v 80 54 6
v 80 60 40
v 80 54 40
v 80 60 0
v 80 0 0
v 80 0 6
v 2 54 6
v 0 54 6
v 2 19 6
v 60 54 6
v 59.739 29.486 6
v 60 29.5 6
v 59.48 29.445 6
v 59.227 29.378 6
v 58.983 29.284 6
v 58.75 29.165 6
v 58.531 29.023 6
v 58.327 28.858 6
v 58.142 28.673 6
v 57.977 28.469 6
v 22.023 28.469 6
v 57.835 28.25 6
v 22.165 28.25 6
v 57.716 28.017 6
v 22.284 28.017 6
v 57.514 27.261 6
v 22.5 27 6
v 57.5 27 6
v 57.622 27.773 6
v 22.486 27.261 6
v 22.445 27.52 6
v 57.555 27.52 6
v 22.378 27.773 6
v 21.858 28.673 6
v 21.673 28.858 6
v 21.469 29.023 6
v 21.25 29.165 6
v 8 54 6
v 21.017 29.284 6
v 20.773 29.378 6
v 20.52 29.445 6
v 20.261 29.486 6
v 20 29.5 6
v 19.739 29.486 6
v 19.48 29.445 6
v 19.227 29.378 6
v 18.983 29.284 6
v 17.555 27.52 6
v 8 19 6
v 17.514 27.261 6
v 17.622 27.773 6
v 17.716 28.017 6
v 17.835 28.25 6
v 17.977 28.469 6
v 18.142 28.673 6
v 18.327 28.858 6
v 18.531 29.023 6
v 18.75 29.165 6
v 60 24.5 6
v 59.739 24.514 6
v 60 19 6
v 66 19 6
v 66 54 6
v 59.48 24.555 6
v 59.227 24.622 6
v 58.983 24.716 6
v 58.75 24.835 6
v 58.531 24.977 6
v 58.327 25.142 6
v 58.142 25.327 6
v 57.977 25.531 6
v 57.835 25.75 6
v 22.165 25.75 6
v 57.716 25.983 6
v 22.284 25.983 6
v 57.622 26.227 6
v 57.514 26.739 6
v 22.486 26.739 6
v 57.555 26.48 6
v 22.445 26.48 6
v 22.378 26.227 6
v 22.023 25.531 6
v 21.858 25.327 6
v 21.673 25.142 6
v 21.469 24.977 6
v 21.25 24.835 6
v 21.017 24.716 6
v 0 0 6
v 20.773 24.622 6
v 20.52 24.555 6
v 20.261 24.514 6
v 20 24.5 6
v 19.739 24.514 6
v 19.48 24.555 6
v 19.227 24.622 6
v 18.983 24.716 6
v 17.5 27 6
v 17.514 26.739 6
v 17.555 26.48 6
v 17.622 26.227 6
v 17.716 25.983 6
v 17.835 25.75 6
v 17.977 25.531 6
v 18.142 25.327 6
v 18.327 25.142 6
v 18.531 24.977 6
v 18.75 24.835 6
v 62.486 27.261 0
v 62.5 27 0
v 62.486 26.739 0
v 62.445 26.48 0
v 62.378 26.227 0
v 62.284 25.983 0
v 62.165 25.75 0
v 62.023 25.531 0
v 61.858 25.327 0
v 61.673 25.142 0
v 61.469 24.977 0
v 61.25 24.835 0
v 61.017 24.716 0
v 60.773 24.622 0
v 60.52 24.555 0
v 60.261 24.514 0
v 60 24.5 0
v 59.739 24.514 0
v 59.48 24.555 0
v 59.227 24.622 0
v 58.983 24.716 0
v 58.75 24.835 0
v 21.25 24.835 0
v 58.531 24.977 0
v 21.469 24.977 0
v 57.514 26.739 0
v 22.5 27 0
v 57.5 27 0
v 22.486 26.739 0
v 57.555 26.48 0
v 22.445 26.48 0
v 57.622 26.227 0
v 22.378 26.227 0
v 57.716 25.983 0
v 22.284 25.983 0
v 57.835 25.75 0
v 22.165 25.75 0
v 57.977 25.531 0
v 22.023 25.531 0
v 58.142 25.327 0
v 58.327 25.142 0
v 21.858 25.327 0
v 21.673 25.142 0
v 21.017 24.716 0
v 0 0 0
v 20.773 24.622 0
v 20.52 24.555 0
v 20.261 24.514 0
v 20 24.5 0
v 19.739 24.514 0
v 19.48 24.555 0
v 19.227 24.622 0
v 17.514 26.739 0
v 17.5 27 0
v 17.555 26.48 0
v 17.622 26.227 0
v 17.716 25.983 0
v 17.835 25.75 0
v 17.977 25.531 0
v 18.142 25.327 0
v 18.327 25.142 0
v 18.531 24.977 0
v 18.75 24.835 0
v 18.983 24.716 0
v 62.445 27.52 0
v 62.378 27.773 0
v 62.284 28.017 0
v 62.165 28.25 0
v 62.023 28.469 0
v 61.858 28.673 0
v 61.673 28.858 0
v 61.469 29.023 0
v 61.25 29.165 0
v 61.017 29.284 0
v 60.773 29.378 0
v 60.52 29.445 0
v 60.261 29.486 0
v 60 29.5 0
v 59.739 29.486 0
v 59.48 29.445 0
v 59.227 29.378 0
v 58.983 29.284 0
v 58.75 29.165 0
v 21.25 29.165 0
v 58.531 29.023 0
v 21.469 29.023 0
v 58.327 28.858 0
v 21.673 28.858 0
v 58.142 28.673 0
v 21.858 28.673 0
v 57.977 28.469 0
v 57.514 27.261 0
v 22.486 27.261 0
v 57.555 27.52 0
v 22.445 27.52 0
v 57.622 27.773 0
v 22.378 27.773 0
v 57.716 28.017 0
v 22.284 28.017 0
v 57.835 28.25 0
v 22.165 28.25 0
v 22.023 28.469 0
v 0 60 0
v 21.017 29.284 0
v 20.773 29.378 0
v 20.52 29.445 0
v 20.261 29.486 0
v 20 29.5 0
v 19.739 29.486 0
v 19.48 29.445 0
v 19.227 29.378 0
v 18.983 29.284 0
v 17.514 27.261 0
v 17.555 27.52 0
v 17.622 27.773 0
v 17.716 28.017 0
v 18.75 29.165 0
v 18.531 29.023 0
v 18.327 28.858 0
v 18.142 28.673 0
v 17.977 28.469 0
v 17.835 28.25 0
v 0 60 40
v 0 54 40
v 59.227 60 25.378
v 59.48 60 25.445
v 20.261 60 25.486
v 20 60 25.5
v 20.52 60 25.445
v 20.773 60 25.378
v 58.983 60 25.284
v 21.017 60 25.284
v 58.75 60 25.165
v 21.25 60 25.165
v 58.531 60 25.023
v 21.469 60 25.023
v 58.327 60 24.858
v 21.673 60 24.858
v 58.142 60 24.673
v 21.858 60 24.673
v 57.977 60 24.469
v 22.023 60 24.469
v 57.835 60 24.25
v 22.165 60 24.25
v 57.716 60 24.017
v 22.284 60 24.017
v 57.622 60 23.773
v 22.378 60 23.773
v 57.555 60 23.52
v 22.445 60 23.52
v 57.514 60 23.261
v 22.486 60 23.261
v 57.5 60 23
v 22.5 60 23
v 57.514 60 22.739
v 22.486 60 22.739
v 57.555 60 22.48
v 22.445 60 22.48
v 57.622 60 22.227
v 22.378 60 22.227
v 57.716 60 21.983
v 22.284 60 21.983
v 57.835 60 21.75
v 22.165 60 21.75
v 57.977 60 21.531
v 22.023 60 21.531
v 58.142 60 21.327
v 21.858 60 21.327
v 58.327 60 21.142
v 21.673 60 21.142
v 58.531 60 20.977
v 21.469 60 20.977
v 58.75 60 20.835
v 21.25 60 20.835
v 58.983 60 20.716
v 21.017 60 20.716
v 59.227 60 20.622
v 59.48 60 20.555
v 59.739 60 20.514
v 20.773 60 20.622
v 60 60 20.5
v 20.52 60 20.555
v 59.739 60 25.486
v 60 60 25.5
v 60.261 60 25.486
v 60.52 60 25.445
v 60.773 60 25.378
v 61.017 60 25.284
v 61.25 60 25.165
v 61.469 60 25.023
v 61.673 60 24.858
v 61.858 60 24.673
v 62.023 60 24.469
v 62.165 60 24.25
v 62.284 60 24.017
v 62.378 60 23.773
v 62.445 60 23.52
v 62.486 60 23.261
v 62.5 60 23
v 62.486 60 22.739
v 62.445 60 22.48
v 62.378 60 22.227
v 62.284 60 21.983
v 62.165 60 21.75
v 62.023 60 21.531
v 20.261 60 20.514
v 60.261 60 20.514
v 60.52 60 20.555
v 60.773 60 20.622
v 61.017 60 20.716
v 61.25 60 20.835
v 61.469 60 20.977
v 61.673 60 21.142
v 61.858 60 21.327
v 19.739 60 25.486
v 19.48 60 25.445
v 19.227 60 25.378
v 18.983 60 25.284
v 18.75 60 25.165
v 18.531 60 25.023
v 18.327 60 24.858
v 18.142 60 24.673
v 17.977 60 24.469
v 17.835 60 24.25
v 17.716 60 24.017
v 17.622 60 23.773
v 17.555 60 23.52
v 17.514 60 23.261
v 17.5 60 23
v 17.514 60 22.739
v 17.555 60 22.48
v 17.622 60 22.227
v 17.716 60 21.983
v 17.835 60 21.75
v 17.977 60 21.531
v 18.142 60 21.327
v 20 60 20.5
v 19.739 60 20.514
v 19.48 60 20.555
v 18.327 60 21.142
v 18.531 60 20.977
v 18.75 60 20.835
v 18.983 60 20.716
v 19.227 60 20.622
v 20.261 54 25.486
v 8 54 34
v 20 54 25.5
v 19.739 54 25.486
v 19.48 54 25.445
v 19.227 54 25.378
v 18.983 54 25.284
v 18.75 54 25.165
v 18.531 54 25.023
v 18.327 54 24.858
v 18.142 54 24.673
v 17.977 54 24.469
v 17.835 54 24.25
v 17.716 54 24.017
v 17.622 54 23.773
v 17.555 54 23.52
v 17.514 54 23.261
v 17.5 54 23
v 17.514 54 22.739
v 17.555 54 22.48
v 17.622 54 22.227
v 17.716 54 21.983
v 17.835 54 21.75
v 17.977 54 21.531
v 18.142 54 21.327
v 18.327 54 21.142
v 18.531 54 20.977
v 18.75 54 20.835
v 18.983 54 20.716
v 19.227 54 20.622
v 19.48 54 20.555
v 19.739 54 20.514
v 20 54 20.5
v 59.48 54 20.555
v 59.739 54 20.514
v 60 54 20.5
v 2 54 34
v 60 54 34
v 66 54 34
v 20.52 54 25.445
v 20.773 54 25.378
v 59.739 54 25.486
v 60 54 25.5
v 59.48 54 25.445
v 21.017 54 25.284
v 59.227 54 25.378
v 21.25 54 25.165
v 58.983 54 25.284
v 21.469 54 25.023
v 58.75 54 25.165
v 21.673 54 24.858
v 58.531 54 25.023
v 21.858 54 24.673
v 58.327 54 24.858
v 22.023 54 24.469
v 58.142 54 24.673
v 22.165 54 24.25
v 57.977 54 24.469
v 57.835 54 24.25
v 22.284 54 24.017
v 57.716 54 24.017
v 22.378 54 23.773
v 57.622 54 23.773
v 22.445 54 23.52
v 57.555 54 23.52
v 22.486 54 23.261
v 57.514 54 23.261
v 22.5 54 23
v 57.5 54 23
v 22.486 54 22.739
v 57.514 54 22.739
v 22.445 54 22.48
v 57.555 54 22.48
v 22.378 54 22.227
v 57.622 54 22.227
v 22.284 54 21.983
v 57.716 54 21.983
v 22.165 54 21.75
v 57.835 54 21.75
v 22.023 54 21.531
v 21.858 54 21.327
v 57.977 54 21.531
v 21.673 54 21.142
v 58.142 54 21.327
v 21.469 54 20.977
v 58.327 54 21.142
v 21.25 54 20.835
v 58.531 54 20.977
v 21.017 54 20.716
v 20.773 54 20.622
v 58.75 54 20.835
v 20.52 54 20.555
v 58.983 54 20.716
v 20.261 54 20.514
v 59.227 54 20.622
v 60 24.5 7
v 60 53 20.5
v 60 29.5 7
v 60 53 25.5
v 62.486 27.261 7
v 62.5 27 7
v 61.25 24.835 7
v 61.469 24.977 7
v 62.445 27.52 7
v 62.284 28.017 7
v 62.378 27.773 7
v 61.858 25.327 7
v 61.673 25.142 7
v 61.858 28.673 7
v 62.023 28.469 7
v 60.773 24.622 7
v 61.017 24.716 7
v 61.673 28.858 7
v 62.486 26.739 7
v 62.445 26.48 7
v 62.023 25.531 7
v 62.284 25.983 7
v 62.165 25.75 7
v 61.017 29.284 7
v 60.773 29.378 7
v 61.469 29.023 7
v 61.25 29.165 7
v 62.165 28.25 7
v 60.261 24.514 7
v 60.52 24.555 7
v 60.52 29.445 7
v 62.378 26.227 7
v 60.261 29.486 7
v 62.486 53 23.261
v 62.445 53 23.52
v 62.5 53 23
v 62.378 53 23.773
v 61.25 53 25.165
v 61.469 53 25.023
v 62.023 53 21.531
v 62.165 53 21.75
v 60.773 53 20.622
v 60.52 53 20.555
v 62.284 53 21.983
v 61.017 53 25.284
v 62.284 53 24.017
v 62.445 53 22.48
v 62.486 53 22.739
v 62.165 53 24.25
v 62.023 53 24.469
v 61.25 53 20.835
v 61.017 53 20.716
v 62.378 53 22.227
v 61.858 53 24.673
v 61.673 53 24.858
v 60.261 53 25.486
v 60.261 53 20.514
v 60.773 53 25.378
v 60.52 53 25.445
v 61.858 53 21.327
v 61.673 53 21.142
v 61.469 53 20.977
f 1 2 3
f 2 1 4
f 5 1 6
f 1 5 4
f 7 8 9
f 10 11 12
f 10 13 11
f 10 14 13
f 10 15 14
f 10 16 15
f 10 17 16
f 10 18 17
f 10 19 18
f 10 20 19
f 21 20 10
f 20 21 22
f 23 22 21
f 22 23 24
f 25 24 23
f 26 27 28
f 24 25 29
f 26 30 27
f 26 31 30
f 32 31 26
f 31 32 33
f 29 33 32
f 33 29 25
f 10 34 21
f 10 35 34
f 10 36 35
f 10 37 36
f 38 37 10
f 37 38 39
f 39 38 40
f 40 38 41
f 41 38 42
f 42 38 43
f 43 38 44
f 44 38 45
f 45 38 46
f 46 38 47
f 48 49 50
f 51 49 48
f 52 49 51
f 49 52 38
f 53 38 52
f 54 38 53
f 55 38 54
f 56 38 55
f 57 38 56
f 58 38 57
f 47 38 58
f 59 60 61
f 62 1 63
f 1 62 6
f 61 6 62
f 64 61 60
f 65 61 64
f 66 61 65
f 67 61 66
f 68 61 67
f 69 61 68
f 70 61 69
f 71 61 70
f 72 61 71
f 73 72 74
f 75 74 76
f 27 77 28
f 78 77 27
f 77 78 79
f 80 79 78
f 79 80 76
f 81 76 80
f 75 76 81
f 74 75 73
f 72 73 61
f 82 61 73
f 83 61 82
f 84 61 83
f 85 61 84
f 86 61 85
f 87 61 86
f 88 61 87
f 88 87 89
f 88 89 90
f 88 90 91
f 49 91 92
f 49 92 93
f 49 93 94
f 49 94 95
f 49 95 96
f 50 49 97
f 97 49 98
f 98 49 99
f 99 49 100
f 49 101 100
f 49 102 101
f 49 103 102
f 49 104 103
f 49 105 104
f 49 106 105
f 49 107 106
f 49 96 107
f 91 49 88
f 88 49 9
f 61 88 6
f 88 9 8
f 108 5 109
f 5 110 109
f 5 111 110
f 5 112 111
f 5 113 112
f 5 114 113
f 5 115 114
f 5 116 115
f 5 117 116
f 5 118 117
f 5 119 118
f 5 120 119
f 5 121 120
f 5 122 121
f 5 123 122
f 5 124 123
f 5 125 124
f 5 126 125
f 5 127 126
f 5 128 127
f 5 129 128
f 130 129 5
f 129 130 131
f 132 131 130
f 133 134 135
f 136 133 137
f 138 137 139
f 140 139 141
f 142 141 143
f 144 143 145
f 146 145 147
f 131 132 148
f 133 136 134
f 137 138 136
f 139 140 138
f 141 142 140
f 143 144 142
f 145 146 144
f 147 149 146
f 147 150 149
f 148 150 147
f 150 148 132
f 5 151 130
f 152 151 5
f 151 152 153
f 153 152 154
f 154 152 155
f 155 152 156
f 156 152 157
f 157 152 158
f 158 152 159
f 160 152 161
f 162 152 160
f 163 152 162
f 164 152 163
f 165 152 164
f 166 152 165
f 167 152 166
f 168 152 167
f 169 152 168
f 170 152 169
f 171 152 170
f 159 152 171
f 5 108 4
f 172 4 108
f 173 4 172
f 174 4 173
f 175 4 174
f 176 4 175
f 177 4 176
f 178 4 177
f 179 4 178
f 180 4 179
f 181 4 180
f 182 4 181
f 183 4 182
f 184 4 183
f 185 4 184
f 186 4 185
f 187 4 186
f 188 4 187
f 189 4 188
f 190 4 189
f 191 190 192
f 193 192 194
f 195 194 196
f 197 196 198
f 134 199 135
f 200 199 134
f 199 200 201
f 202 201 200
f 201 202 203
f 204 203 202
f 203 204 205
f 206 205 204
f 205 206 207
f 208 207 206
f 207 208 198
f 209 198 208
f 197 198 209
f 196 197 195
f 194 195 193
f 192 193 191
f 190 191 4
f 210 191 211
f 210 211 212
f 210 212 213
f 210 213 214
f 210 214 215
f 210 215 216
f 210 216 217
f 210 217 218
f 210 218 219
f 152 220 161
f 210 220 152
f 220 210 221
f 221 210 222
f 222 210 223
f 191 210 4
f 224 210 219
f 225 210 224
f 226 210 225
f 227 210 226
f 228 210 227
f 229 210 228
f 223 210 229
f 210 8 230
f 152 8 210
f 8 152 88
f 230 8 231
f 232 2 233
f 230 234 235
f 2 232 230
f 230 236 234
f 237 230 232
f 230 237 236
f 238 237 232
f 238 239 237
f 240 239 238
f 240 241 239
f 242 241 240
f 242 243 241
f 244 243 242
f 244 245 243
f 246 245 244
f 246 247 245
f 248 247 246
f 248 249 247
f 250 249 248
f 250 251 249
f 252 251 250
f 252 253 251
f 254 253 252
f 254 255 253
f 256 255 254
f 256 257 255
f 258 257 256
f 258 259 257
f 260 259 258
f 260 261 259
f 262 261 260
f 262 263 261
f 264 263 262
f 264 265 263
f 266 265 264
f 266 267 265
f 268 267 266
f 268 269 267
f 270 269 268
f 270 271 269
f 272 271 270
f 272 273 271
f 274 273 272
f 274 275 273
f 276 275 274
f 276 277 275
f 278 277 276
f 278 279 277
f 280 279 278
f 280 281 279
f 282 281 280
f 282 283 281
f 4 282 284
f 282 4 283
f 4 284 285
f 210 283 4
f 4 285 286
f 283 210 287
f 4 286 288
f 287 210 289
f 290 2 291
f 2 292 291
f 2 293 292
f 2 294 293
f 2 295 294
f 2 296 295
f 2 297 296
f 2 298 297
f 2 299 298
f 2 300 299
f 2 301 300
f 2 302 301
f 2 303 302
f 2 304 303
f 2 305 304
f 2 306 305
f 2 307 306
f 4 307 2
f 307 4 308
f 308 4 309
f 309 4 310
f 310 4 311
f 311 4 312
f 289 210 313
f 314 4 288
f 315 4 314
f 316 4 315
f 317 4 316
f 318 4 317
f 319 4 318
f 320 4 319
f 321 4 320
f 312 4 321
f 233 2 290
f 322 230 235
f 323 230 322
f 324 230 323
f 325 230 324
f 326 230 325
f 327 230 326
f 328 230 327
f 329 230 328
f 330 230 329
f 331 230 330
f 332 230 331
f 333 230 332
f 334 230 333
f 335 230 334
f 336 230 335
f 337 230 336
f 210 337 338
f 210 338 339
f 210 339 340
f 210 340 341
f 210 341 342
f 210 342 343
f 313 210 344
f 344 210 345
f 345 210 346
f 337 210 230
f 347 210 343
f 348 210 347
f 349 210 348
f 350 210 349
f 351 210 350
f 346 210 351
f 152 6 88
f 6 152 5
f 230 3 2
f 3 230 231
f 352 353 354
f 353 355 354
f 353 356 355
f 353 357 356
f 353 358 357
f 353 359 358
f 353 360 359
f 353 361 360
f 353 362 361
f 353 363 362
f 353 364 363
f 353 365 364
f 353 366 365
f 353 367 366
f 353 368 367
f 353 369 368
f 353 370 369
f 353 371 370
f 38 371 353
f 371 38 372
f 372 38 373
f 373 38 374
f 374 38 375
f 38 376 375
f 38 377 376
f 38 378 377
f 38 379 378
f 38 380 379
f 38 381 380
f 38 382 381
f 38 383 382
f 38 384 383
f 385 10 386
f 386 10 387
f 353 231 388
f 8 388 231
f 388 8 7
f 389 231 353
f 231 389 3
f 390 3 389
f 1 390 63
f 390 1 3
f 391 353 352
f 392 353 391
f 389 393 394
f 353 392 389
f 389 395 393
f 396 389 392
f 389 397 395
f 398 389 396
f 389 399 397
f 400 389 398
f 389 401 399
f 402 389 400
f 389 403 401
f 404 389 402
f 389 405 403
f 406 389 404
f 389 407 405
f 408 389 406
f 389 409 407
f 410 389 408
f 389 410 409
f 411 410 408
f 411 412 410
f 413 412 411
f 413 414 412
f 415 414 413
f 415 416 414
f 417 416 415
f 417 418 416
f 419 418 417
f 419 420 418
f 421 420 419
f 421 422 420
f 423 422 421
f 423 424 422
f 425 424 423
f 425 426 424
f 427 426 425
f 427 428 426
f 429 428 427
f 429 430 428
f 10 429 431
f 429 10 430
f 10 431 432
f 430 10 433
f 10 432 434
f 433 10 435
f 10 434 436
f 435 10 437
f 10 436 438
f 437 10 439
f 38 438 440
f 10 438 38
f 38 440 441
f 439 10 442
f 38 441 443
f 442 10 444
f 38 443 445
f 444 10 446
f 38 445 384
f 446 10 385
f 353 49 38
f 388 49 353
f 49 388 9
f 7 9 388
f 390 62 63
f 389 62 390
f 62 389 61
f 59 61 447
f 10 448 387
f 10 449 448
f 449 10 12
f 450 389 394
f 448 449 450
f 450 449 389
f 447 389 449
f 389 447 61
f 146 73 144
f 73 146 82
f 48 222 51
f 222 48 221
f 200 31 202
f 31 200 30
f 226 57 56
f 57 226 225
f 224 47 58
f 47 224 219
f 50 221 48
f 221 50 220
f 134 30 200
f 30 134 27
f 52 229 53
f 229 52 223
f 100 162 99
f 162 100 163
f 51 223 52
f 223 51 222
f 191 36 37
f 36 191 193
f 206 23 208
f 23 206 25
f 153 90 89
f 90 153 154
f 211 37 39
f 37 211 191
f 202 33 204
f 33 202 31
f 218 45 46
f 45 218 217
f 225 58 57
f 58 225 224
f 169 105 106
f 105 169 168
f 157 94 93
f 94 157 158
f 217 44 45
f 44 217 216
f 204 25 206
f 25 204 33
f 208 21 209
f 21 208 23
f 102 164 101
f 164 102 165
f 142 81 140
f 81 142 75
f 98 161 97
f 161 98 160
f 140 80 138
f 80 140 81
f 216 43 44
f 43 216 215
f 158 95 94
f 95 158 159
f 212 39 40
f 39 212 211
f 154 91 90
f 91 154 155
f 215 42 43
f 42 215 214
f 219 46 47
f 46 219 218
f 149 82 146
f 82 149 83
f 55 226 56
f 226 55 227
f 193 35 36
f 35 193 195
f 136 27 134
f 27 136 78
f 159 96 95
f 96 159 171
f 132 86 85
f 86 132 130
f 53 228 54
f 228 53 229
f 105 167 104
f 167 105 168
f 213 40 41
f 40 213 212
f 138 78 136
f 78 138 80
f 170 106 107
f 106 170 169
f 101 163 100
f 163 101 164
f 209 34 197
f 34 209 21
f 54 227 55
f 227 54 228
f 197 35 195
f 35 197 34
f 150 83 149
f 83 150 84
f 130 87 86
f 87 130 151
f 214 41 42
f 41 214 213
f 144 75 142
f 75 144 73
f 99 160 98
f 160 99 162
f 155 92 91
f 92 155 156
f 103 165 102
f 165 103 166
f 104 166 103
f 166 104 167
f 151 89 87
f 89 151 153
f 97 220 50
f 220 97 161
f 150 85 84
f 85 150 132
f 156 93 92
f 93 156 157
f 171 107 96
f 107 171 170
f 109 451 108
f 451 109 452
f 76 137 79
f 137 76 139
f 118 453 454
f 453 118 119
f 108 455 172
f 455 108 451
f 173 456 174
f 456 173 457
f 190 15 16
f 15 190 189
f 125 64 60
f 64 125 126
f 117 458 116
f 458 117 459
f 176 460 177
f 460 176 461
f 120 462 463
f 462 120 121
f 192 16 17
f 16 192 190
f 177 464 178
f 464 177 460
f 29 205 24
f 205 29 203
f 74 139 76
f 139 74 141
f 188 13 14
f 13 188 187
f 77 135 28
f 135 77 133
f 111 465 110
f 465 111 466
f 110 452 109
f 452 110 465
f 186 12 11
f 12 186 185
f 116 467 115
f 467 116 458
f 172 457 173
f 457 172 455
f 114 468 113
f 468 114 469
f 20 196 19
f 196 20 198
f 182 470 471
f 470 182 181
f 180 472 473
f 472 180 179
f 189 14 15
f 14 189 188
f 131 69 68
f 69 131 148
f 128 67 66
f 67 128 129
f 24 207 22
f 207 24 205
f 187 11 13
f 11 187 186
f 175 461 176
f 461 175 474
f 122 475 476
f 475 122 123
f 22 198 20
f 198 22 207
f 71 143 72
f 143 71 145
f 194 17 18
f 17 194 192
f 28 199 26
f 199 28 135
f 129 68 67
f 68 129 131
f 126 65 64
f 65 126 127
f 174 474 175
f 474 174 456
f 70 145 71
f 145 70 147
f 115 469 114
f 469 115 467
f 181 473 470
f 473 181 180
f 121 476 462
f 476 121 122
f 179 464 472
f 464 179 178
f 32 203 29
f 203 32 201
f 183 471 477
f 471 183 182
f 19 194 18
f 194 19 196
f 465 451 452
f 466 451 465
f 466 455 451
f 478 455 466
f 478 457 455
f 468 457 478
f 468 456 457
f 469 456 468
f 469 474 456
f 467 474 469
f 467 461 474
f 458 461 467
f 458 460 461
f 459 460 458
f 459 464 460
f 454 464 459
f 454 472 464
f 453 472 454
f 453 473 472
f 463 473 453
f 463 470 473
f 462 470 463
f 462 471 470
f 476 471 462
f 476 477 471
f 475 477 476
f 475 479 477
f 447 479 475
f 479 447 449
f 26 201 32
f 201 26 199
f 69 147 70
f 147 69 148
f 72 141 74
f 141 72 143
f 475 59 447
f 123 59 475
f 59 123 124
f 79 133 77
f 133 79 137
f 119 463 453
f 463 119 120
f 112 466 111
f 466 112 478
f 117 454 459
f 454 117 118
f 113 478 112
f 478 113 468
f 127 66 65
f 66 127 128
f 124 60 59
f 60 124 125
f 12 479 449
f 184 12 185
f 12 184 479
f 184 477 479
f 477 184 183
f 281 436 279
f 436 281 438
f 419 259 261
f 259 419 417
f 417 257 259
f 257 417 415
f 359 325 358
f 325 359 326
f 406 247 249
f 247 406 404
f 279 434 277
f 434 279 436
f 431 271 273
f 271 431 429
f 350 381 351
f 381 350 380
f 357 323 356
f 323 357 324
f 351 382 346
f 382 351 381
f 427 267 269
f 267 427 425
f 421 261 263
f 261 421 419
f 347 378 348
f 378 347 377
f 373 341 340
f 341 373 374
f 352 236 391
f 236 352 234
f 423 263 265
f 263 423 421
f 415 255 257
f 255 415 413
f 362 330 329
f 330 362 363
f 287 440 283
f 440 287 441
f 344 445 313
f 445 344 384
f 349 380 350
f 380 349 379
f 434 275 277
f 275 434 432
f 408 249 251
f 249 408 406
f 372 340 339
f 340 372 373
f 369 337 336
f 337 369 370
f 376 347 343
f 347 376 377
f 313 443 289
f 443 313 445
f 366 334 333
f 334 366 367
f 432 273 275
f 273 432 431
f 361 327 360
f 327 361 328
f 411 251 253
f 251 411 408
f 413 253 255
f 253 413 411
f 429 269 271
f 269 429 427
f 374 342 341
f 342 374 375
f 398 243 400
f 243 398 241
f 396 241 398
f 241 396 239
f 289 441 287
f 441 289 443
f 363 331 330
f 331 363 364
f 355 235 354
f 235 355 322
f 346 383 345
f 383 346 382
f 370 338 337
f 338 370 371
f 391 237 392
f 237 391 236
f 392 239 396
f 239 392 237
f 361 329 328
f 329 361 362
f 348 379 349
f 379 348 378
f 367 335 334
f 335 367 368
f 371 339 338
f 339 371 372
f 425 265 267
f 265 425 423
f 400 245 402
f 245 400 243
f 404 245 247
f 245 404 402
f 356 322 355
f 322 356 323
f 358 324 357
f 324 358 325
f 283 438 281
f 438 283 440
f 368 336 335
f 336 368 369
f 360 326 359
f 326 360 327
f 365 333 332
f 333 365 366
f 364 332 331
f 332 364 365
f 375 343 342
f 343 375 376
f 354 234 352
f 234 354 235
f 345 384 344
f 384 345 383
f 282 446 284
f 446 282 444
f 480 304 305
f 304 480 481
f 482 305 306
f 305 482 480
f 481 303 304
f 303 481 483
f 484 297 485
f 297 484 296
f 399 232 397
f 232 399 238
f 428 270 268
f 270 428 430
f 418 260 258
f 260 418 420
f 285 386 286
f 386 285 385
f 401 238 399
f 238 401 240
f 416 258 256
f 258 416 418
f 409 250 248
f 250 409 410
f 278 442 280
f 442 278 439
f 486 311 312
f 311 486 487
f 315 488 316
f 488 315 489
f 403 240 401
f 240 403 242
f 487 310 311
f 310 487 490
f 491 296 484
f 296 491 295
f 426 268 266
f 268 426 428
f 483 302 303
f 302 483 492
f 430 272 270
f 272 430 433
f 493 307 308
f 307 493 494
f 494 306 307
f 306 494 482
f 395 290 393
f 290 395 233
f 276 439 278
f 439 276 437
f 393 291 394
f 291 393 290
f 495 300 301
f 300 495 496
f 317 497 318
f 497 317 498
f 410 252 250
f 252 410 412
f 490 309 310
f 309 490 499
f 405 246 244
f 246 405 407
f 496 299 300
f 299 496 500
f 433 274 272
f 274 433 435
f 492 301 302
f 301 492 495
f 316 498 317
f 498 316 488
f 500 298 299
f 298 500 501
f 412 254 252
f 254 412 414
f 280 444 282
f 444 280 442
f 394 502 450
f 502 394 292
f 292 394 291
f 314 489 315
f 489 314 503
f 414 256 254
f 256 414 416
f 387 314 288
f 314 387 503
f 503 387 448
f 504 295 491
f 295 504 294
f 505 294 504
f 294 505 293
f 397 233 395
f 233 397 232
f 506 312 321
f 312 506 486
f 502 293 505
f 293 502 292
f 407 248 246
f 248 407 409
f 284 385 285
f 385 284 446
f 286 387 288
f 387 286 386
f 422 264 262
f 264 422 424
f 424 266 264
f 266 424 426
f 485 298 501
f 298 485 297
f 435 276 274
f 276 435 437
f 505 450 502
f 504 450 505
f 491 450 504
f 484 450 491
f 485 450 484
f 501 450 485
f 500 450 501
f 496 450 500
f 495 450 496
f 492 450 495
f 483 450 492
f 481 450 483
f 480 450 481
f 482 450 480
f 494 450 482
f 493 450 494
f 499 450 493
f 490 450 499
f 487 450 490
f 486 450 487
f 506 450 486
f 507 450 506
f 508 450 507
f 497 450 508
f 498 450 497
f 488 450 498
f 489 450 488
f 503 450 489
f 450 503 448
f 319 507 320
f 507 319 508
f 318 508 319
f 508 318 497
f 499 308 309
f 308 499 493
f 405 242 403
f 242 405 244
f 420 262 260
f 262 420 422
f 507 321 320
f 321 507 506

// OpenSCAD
// L-Bracket with Base Holes, Rear Plate Holes, and Gussets
// Dimensions in millimeters

$fn = 60;

// Dimensions
width = 80;          // X dimension
base_y = 60;         // Y dimension of base plate
base_z = 6;          // Thickness of base plate
back_y = 6;          // Thickness of back plate
back_z = 40;         // Total height of back plate (Z)

hole_dia = 5;        // Diameter for mounting holes
gusset_thick = 6;    // Thickness of triangular gussets
gusset_y = 35;       // Length of gusset along Y
gusset_z = 28;       // Height of gusset along Z

hole_x1 = 20;        // X location for first set of holes
hole_x2 = 60;        // X location for second set of holes

module l_bracket() {
    difference() {
        // Main geometry: Base plate + Back plate + Gussets
        union() {
            // Base plate lying in XY plane
            cube([width, base_y, base_z]);

            // Rear vertical plate rising in +Z along the back edge
            translate([0, base_y - back_y, 0])
                cube([width, back_y, back_z]);

            // Left Gusset
            translate([8, base_y - back_y, base_z])
                rotate([90, 0, -90])
                    linear_extrude(height = gusset_thick)
                        polygon(points = [[0, 0], [gusset_y, 0], [0, gusset_z]]);

            // Right Gusset
            translate([width - 8 - gusset_thick, base_y - back_y, base_z])
                rotate([90, 0, -90])
                    linear_extrude(height = gusset_thick)
                        polygon(points = [[0, 0], [gusset_y, 0], [0, gusset_z]]);
        }

        // Vertical holes in the base plate
        translate([hole_x1, (base_y - back_y) / 2, -1])
            cylinder(d = hole_dia, h = base_z + 2);

        translate([hole_x2, (base_y - back_y) / 2, -1])
            cylinder(d = hole_dia, h = base_z + 2);

        // Horizontal holes in the back plate
        translate([hole_x1, base_y + 1, (back_z + base_z) / 2])
            rotate([90, 0, 0])
                cylinder(d = hole_dia, h = back_y + 2);

        translate([hole_x2, base_y + 1, (back_z + base_z) / 2])
            rotate([90, 0, 0])
                cylinder(d = hole_dia, h = back_y + 2);
    }
}

l_bracket();
